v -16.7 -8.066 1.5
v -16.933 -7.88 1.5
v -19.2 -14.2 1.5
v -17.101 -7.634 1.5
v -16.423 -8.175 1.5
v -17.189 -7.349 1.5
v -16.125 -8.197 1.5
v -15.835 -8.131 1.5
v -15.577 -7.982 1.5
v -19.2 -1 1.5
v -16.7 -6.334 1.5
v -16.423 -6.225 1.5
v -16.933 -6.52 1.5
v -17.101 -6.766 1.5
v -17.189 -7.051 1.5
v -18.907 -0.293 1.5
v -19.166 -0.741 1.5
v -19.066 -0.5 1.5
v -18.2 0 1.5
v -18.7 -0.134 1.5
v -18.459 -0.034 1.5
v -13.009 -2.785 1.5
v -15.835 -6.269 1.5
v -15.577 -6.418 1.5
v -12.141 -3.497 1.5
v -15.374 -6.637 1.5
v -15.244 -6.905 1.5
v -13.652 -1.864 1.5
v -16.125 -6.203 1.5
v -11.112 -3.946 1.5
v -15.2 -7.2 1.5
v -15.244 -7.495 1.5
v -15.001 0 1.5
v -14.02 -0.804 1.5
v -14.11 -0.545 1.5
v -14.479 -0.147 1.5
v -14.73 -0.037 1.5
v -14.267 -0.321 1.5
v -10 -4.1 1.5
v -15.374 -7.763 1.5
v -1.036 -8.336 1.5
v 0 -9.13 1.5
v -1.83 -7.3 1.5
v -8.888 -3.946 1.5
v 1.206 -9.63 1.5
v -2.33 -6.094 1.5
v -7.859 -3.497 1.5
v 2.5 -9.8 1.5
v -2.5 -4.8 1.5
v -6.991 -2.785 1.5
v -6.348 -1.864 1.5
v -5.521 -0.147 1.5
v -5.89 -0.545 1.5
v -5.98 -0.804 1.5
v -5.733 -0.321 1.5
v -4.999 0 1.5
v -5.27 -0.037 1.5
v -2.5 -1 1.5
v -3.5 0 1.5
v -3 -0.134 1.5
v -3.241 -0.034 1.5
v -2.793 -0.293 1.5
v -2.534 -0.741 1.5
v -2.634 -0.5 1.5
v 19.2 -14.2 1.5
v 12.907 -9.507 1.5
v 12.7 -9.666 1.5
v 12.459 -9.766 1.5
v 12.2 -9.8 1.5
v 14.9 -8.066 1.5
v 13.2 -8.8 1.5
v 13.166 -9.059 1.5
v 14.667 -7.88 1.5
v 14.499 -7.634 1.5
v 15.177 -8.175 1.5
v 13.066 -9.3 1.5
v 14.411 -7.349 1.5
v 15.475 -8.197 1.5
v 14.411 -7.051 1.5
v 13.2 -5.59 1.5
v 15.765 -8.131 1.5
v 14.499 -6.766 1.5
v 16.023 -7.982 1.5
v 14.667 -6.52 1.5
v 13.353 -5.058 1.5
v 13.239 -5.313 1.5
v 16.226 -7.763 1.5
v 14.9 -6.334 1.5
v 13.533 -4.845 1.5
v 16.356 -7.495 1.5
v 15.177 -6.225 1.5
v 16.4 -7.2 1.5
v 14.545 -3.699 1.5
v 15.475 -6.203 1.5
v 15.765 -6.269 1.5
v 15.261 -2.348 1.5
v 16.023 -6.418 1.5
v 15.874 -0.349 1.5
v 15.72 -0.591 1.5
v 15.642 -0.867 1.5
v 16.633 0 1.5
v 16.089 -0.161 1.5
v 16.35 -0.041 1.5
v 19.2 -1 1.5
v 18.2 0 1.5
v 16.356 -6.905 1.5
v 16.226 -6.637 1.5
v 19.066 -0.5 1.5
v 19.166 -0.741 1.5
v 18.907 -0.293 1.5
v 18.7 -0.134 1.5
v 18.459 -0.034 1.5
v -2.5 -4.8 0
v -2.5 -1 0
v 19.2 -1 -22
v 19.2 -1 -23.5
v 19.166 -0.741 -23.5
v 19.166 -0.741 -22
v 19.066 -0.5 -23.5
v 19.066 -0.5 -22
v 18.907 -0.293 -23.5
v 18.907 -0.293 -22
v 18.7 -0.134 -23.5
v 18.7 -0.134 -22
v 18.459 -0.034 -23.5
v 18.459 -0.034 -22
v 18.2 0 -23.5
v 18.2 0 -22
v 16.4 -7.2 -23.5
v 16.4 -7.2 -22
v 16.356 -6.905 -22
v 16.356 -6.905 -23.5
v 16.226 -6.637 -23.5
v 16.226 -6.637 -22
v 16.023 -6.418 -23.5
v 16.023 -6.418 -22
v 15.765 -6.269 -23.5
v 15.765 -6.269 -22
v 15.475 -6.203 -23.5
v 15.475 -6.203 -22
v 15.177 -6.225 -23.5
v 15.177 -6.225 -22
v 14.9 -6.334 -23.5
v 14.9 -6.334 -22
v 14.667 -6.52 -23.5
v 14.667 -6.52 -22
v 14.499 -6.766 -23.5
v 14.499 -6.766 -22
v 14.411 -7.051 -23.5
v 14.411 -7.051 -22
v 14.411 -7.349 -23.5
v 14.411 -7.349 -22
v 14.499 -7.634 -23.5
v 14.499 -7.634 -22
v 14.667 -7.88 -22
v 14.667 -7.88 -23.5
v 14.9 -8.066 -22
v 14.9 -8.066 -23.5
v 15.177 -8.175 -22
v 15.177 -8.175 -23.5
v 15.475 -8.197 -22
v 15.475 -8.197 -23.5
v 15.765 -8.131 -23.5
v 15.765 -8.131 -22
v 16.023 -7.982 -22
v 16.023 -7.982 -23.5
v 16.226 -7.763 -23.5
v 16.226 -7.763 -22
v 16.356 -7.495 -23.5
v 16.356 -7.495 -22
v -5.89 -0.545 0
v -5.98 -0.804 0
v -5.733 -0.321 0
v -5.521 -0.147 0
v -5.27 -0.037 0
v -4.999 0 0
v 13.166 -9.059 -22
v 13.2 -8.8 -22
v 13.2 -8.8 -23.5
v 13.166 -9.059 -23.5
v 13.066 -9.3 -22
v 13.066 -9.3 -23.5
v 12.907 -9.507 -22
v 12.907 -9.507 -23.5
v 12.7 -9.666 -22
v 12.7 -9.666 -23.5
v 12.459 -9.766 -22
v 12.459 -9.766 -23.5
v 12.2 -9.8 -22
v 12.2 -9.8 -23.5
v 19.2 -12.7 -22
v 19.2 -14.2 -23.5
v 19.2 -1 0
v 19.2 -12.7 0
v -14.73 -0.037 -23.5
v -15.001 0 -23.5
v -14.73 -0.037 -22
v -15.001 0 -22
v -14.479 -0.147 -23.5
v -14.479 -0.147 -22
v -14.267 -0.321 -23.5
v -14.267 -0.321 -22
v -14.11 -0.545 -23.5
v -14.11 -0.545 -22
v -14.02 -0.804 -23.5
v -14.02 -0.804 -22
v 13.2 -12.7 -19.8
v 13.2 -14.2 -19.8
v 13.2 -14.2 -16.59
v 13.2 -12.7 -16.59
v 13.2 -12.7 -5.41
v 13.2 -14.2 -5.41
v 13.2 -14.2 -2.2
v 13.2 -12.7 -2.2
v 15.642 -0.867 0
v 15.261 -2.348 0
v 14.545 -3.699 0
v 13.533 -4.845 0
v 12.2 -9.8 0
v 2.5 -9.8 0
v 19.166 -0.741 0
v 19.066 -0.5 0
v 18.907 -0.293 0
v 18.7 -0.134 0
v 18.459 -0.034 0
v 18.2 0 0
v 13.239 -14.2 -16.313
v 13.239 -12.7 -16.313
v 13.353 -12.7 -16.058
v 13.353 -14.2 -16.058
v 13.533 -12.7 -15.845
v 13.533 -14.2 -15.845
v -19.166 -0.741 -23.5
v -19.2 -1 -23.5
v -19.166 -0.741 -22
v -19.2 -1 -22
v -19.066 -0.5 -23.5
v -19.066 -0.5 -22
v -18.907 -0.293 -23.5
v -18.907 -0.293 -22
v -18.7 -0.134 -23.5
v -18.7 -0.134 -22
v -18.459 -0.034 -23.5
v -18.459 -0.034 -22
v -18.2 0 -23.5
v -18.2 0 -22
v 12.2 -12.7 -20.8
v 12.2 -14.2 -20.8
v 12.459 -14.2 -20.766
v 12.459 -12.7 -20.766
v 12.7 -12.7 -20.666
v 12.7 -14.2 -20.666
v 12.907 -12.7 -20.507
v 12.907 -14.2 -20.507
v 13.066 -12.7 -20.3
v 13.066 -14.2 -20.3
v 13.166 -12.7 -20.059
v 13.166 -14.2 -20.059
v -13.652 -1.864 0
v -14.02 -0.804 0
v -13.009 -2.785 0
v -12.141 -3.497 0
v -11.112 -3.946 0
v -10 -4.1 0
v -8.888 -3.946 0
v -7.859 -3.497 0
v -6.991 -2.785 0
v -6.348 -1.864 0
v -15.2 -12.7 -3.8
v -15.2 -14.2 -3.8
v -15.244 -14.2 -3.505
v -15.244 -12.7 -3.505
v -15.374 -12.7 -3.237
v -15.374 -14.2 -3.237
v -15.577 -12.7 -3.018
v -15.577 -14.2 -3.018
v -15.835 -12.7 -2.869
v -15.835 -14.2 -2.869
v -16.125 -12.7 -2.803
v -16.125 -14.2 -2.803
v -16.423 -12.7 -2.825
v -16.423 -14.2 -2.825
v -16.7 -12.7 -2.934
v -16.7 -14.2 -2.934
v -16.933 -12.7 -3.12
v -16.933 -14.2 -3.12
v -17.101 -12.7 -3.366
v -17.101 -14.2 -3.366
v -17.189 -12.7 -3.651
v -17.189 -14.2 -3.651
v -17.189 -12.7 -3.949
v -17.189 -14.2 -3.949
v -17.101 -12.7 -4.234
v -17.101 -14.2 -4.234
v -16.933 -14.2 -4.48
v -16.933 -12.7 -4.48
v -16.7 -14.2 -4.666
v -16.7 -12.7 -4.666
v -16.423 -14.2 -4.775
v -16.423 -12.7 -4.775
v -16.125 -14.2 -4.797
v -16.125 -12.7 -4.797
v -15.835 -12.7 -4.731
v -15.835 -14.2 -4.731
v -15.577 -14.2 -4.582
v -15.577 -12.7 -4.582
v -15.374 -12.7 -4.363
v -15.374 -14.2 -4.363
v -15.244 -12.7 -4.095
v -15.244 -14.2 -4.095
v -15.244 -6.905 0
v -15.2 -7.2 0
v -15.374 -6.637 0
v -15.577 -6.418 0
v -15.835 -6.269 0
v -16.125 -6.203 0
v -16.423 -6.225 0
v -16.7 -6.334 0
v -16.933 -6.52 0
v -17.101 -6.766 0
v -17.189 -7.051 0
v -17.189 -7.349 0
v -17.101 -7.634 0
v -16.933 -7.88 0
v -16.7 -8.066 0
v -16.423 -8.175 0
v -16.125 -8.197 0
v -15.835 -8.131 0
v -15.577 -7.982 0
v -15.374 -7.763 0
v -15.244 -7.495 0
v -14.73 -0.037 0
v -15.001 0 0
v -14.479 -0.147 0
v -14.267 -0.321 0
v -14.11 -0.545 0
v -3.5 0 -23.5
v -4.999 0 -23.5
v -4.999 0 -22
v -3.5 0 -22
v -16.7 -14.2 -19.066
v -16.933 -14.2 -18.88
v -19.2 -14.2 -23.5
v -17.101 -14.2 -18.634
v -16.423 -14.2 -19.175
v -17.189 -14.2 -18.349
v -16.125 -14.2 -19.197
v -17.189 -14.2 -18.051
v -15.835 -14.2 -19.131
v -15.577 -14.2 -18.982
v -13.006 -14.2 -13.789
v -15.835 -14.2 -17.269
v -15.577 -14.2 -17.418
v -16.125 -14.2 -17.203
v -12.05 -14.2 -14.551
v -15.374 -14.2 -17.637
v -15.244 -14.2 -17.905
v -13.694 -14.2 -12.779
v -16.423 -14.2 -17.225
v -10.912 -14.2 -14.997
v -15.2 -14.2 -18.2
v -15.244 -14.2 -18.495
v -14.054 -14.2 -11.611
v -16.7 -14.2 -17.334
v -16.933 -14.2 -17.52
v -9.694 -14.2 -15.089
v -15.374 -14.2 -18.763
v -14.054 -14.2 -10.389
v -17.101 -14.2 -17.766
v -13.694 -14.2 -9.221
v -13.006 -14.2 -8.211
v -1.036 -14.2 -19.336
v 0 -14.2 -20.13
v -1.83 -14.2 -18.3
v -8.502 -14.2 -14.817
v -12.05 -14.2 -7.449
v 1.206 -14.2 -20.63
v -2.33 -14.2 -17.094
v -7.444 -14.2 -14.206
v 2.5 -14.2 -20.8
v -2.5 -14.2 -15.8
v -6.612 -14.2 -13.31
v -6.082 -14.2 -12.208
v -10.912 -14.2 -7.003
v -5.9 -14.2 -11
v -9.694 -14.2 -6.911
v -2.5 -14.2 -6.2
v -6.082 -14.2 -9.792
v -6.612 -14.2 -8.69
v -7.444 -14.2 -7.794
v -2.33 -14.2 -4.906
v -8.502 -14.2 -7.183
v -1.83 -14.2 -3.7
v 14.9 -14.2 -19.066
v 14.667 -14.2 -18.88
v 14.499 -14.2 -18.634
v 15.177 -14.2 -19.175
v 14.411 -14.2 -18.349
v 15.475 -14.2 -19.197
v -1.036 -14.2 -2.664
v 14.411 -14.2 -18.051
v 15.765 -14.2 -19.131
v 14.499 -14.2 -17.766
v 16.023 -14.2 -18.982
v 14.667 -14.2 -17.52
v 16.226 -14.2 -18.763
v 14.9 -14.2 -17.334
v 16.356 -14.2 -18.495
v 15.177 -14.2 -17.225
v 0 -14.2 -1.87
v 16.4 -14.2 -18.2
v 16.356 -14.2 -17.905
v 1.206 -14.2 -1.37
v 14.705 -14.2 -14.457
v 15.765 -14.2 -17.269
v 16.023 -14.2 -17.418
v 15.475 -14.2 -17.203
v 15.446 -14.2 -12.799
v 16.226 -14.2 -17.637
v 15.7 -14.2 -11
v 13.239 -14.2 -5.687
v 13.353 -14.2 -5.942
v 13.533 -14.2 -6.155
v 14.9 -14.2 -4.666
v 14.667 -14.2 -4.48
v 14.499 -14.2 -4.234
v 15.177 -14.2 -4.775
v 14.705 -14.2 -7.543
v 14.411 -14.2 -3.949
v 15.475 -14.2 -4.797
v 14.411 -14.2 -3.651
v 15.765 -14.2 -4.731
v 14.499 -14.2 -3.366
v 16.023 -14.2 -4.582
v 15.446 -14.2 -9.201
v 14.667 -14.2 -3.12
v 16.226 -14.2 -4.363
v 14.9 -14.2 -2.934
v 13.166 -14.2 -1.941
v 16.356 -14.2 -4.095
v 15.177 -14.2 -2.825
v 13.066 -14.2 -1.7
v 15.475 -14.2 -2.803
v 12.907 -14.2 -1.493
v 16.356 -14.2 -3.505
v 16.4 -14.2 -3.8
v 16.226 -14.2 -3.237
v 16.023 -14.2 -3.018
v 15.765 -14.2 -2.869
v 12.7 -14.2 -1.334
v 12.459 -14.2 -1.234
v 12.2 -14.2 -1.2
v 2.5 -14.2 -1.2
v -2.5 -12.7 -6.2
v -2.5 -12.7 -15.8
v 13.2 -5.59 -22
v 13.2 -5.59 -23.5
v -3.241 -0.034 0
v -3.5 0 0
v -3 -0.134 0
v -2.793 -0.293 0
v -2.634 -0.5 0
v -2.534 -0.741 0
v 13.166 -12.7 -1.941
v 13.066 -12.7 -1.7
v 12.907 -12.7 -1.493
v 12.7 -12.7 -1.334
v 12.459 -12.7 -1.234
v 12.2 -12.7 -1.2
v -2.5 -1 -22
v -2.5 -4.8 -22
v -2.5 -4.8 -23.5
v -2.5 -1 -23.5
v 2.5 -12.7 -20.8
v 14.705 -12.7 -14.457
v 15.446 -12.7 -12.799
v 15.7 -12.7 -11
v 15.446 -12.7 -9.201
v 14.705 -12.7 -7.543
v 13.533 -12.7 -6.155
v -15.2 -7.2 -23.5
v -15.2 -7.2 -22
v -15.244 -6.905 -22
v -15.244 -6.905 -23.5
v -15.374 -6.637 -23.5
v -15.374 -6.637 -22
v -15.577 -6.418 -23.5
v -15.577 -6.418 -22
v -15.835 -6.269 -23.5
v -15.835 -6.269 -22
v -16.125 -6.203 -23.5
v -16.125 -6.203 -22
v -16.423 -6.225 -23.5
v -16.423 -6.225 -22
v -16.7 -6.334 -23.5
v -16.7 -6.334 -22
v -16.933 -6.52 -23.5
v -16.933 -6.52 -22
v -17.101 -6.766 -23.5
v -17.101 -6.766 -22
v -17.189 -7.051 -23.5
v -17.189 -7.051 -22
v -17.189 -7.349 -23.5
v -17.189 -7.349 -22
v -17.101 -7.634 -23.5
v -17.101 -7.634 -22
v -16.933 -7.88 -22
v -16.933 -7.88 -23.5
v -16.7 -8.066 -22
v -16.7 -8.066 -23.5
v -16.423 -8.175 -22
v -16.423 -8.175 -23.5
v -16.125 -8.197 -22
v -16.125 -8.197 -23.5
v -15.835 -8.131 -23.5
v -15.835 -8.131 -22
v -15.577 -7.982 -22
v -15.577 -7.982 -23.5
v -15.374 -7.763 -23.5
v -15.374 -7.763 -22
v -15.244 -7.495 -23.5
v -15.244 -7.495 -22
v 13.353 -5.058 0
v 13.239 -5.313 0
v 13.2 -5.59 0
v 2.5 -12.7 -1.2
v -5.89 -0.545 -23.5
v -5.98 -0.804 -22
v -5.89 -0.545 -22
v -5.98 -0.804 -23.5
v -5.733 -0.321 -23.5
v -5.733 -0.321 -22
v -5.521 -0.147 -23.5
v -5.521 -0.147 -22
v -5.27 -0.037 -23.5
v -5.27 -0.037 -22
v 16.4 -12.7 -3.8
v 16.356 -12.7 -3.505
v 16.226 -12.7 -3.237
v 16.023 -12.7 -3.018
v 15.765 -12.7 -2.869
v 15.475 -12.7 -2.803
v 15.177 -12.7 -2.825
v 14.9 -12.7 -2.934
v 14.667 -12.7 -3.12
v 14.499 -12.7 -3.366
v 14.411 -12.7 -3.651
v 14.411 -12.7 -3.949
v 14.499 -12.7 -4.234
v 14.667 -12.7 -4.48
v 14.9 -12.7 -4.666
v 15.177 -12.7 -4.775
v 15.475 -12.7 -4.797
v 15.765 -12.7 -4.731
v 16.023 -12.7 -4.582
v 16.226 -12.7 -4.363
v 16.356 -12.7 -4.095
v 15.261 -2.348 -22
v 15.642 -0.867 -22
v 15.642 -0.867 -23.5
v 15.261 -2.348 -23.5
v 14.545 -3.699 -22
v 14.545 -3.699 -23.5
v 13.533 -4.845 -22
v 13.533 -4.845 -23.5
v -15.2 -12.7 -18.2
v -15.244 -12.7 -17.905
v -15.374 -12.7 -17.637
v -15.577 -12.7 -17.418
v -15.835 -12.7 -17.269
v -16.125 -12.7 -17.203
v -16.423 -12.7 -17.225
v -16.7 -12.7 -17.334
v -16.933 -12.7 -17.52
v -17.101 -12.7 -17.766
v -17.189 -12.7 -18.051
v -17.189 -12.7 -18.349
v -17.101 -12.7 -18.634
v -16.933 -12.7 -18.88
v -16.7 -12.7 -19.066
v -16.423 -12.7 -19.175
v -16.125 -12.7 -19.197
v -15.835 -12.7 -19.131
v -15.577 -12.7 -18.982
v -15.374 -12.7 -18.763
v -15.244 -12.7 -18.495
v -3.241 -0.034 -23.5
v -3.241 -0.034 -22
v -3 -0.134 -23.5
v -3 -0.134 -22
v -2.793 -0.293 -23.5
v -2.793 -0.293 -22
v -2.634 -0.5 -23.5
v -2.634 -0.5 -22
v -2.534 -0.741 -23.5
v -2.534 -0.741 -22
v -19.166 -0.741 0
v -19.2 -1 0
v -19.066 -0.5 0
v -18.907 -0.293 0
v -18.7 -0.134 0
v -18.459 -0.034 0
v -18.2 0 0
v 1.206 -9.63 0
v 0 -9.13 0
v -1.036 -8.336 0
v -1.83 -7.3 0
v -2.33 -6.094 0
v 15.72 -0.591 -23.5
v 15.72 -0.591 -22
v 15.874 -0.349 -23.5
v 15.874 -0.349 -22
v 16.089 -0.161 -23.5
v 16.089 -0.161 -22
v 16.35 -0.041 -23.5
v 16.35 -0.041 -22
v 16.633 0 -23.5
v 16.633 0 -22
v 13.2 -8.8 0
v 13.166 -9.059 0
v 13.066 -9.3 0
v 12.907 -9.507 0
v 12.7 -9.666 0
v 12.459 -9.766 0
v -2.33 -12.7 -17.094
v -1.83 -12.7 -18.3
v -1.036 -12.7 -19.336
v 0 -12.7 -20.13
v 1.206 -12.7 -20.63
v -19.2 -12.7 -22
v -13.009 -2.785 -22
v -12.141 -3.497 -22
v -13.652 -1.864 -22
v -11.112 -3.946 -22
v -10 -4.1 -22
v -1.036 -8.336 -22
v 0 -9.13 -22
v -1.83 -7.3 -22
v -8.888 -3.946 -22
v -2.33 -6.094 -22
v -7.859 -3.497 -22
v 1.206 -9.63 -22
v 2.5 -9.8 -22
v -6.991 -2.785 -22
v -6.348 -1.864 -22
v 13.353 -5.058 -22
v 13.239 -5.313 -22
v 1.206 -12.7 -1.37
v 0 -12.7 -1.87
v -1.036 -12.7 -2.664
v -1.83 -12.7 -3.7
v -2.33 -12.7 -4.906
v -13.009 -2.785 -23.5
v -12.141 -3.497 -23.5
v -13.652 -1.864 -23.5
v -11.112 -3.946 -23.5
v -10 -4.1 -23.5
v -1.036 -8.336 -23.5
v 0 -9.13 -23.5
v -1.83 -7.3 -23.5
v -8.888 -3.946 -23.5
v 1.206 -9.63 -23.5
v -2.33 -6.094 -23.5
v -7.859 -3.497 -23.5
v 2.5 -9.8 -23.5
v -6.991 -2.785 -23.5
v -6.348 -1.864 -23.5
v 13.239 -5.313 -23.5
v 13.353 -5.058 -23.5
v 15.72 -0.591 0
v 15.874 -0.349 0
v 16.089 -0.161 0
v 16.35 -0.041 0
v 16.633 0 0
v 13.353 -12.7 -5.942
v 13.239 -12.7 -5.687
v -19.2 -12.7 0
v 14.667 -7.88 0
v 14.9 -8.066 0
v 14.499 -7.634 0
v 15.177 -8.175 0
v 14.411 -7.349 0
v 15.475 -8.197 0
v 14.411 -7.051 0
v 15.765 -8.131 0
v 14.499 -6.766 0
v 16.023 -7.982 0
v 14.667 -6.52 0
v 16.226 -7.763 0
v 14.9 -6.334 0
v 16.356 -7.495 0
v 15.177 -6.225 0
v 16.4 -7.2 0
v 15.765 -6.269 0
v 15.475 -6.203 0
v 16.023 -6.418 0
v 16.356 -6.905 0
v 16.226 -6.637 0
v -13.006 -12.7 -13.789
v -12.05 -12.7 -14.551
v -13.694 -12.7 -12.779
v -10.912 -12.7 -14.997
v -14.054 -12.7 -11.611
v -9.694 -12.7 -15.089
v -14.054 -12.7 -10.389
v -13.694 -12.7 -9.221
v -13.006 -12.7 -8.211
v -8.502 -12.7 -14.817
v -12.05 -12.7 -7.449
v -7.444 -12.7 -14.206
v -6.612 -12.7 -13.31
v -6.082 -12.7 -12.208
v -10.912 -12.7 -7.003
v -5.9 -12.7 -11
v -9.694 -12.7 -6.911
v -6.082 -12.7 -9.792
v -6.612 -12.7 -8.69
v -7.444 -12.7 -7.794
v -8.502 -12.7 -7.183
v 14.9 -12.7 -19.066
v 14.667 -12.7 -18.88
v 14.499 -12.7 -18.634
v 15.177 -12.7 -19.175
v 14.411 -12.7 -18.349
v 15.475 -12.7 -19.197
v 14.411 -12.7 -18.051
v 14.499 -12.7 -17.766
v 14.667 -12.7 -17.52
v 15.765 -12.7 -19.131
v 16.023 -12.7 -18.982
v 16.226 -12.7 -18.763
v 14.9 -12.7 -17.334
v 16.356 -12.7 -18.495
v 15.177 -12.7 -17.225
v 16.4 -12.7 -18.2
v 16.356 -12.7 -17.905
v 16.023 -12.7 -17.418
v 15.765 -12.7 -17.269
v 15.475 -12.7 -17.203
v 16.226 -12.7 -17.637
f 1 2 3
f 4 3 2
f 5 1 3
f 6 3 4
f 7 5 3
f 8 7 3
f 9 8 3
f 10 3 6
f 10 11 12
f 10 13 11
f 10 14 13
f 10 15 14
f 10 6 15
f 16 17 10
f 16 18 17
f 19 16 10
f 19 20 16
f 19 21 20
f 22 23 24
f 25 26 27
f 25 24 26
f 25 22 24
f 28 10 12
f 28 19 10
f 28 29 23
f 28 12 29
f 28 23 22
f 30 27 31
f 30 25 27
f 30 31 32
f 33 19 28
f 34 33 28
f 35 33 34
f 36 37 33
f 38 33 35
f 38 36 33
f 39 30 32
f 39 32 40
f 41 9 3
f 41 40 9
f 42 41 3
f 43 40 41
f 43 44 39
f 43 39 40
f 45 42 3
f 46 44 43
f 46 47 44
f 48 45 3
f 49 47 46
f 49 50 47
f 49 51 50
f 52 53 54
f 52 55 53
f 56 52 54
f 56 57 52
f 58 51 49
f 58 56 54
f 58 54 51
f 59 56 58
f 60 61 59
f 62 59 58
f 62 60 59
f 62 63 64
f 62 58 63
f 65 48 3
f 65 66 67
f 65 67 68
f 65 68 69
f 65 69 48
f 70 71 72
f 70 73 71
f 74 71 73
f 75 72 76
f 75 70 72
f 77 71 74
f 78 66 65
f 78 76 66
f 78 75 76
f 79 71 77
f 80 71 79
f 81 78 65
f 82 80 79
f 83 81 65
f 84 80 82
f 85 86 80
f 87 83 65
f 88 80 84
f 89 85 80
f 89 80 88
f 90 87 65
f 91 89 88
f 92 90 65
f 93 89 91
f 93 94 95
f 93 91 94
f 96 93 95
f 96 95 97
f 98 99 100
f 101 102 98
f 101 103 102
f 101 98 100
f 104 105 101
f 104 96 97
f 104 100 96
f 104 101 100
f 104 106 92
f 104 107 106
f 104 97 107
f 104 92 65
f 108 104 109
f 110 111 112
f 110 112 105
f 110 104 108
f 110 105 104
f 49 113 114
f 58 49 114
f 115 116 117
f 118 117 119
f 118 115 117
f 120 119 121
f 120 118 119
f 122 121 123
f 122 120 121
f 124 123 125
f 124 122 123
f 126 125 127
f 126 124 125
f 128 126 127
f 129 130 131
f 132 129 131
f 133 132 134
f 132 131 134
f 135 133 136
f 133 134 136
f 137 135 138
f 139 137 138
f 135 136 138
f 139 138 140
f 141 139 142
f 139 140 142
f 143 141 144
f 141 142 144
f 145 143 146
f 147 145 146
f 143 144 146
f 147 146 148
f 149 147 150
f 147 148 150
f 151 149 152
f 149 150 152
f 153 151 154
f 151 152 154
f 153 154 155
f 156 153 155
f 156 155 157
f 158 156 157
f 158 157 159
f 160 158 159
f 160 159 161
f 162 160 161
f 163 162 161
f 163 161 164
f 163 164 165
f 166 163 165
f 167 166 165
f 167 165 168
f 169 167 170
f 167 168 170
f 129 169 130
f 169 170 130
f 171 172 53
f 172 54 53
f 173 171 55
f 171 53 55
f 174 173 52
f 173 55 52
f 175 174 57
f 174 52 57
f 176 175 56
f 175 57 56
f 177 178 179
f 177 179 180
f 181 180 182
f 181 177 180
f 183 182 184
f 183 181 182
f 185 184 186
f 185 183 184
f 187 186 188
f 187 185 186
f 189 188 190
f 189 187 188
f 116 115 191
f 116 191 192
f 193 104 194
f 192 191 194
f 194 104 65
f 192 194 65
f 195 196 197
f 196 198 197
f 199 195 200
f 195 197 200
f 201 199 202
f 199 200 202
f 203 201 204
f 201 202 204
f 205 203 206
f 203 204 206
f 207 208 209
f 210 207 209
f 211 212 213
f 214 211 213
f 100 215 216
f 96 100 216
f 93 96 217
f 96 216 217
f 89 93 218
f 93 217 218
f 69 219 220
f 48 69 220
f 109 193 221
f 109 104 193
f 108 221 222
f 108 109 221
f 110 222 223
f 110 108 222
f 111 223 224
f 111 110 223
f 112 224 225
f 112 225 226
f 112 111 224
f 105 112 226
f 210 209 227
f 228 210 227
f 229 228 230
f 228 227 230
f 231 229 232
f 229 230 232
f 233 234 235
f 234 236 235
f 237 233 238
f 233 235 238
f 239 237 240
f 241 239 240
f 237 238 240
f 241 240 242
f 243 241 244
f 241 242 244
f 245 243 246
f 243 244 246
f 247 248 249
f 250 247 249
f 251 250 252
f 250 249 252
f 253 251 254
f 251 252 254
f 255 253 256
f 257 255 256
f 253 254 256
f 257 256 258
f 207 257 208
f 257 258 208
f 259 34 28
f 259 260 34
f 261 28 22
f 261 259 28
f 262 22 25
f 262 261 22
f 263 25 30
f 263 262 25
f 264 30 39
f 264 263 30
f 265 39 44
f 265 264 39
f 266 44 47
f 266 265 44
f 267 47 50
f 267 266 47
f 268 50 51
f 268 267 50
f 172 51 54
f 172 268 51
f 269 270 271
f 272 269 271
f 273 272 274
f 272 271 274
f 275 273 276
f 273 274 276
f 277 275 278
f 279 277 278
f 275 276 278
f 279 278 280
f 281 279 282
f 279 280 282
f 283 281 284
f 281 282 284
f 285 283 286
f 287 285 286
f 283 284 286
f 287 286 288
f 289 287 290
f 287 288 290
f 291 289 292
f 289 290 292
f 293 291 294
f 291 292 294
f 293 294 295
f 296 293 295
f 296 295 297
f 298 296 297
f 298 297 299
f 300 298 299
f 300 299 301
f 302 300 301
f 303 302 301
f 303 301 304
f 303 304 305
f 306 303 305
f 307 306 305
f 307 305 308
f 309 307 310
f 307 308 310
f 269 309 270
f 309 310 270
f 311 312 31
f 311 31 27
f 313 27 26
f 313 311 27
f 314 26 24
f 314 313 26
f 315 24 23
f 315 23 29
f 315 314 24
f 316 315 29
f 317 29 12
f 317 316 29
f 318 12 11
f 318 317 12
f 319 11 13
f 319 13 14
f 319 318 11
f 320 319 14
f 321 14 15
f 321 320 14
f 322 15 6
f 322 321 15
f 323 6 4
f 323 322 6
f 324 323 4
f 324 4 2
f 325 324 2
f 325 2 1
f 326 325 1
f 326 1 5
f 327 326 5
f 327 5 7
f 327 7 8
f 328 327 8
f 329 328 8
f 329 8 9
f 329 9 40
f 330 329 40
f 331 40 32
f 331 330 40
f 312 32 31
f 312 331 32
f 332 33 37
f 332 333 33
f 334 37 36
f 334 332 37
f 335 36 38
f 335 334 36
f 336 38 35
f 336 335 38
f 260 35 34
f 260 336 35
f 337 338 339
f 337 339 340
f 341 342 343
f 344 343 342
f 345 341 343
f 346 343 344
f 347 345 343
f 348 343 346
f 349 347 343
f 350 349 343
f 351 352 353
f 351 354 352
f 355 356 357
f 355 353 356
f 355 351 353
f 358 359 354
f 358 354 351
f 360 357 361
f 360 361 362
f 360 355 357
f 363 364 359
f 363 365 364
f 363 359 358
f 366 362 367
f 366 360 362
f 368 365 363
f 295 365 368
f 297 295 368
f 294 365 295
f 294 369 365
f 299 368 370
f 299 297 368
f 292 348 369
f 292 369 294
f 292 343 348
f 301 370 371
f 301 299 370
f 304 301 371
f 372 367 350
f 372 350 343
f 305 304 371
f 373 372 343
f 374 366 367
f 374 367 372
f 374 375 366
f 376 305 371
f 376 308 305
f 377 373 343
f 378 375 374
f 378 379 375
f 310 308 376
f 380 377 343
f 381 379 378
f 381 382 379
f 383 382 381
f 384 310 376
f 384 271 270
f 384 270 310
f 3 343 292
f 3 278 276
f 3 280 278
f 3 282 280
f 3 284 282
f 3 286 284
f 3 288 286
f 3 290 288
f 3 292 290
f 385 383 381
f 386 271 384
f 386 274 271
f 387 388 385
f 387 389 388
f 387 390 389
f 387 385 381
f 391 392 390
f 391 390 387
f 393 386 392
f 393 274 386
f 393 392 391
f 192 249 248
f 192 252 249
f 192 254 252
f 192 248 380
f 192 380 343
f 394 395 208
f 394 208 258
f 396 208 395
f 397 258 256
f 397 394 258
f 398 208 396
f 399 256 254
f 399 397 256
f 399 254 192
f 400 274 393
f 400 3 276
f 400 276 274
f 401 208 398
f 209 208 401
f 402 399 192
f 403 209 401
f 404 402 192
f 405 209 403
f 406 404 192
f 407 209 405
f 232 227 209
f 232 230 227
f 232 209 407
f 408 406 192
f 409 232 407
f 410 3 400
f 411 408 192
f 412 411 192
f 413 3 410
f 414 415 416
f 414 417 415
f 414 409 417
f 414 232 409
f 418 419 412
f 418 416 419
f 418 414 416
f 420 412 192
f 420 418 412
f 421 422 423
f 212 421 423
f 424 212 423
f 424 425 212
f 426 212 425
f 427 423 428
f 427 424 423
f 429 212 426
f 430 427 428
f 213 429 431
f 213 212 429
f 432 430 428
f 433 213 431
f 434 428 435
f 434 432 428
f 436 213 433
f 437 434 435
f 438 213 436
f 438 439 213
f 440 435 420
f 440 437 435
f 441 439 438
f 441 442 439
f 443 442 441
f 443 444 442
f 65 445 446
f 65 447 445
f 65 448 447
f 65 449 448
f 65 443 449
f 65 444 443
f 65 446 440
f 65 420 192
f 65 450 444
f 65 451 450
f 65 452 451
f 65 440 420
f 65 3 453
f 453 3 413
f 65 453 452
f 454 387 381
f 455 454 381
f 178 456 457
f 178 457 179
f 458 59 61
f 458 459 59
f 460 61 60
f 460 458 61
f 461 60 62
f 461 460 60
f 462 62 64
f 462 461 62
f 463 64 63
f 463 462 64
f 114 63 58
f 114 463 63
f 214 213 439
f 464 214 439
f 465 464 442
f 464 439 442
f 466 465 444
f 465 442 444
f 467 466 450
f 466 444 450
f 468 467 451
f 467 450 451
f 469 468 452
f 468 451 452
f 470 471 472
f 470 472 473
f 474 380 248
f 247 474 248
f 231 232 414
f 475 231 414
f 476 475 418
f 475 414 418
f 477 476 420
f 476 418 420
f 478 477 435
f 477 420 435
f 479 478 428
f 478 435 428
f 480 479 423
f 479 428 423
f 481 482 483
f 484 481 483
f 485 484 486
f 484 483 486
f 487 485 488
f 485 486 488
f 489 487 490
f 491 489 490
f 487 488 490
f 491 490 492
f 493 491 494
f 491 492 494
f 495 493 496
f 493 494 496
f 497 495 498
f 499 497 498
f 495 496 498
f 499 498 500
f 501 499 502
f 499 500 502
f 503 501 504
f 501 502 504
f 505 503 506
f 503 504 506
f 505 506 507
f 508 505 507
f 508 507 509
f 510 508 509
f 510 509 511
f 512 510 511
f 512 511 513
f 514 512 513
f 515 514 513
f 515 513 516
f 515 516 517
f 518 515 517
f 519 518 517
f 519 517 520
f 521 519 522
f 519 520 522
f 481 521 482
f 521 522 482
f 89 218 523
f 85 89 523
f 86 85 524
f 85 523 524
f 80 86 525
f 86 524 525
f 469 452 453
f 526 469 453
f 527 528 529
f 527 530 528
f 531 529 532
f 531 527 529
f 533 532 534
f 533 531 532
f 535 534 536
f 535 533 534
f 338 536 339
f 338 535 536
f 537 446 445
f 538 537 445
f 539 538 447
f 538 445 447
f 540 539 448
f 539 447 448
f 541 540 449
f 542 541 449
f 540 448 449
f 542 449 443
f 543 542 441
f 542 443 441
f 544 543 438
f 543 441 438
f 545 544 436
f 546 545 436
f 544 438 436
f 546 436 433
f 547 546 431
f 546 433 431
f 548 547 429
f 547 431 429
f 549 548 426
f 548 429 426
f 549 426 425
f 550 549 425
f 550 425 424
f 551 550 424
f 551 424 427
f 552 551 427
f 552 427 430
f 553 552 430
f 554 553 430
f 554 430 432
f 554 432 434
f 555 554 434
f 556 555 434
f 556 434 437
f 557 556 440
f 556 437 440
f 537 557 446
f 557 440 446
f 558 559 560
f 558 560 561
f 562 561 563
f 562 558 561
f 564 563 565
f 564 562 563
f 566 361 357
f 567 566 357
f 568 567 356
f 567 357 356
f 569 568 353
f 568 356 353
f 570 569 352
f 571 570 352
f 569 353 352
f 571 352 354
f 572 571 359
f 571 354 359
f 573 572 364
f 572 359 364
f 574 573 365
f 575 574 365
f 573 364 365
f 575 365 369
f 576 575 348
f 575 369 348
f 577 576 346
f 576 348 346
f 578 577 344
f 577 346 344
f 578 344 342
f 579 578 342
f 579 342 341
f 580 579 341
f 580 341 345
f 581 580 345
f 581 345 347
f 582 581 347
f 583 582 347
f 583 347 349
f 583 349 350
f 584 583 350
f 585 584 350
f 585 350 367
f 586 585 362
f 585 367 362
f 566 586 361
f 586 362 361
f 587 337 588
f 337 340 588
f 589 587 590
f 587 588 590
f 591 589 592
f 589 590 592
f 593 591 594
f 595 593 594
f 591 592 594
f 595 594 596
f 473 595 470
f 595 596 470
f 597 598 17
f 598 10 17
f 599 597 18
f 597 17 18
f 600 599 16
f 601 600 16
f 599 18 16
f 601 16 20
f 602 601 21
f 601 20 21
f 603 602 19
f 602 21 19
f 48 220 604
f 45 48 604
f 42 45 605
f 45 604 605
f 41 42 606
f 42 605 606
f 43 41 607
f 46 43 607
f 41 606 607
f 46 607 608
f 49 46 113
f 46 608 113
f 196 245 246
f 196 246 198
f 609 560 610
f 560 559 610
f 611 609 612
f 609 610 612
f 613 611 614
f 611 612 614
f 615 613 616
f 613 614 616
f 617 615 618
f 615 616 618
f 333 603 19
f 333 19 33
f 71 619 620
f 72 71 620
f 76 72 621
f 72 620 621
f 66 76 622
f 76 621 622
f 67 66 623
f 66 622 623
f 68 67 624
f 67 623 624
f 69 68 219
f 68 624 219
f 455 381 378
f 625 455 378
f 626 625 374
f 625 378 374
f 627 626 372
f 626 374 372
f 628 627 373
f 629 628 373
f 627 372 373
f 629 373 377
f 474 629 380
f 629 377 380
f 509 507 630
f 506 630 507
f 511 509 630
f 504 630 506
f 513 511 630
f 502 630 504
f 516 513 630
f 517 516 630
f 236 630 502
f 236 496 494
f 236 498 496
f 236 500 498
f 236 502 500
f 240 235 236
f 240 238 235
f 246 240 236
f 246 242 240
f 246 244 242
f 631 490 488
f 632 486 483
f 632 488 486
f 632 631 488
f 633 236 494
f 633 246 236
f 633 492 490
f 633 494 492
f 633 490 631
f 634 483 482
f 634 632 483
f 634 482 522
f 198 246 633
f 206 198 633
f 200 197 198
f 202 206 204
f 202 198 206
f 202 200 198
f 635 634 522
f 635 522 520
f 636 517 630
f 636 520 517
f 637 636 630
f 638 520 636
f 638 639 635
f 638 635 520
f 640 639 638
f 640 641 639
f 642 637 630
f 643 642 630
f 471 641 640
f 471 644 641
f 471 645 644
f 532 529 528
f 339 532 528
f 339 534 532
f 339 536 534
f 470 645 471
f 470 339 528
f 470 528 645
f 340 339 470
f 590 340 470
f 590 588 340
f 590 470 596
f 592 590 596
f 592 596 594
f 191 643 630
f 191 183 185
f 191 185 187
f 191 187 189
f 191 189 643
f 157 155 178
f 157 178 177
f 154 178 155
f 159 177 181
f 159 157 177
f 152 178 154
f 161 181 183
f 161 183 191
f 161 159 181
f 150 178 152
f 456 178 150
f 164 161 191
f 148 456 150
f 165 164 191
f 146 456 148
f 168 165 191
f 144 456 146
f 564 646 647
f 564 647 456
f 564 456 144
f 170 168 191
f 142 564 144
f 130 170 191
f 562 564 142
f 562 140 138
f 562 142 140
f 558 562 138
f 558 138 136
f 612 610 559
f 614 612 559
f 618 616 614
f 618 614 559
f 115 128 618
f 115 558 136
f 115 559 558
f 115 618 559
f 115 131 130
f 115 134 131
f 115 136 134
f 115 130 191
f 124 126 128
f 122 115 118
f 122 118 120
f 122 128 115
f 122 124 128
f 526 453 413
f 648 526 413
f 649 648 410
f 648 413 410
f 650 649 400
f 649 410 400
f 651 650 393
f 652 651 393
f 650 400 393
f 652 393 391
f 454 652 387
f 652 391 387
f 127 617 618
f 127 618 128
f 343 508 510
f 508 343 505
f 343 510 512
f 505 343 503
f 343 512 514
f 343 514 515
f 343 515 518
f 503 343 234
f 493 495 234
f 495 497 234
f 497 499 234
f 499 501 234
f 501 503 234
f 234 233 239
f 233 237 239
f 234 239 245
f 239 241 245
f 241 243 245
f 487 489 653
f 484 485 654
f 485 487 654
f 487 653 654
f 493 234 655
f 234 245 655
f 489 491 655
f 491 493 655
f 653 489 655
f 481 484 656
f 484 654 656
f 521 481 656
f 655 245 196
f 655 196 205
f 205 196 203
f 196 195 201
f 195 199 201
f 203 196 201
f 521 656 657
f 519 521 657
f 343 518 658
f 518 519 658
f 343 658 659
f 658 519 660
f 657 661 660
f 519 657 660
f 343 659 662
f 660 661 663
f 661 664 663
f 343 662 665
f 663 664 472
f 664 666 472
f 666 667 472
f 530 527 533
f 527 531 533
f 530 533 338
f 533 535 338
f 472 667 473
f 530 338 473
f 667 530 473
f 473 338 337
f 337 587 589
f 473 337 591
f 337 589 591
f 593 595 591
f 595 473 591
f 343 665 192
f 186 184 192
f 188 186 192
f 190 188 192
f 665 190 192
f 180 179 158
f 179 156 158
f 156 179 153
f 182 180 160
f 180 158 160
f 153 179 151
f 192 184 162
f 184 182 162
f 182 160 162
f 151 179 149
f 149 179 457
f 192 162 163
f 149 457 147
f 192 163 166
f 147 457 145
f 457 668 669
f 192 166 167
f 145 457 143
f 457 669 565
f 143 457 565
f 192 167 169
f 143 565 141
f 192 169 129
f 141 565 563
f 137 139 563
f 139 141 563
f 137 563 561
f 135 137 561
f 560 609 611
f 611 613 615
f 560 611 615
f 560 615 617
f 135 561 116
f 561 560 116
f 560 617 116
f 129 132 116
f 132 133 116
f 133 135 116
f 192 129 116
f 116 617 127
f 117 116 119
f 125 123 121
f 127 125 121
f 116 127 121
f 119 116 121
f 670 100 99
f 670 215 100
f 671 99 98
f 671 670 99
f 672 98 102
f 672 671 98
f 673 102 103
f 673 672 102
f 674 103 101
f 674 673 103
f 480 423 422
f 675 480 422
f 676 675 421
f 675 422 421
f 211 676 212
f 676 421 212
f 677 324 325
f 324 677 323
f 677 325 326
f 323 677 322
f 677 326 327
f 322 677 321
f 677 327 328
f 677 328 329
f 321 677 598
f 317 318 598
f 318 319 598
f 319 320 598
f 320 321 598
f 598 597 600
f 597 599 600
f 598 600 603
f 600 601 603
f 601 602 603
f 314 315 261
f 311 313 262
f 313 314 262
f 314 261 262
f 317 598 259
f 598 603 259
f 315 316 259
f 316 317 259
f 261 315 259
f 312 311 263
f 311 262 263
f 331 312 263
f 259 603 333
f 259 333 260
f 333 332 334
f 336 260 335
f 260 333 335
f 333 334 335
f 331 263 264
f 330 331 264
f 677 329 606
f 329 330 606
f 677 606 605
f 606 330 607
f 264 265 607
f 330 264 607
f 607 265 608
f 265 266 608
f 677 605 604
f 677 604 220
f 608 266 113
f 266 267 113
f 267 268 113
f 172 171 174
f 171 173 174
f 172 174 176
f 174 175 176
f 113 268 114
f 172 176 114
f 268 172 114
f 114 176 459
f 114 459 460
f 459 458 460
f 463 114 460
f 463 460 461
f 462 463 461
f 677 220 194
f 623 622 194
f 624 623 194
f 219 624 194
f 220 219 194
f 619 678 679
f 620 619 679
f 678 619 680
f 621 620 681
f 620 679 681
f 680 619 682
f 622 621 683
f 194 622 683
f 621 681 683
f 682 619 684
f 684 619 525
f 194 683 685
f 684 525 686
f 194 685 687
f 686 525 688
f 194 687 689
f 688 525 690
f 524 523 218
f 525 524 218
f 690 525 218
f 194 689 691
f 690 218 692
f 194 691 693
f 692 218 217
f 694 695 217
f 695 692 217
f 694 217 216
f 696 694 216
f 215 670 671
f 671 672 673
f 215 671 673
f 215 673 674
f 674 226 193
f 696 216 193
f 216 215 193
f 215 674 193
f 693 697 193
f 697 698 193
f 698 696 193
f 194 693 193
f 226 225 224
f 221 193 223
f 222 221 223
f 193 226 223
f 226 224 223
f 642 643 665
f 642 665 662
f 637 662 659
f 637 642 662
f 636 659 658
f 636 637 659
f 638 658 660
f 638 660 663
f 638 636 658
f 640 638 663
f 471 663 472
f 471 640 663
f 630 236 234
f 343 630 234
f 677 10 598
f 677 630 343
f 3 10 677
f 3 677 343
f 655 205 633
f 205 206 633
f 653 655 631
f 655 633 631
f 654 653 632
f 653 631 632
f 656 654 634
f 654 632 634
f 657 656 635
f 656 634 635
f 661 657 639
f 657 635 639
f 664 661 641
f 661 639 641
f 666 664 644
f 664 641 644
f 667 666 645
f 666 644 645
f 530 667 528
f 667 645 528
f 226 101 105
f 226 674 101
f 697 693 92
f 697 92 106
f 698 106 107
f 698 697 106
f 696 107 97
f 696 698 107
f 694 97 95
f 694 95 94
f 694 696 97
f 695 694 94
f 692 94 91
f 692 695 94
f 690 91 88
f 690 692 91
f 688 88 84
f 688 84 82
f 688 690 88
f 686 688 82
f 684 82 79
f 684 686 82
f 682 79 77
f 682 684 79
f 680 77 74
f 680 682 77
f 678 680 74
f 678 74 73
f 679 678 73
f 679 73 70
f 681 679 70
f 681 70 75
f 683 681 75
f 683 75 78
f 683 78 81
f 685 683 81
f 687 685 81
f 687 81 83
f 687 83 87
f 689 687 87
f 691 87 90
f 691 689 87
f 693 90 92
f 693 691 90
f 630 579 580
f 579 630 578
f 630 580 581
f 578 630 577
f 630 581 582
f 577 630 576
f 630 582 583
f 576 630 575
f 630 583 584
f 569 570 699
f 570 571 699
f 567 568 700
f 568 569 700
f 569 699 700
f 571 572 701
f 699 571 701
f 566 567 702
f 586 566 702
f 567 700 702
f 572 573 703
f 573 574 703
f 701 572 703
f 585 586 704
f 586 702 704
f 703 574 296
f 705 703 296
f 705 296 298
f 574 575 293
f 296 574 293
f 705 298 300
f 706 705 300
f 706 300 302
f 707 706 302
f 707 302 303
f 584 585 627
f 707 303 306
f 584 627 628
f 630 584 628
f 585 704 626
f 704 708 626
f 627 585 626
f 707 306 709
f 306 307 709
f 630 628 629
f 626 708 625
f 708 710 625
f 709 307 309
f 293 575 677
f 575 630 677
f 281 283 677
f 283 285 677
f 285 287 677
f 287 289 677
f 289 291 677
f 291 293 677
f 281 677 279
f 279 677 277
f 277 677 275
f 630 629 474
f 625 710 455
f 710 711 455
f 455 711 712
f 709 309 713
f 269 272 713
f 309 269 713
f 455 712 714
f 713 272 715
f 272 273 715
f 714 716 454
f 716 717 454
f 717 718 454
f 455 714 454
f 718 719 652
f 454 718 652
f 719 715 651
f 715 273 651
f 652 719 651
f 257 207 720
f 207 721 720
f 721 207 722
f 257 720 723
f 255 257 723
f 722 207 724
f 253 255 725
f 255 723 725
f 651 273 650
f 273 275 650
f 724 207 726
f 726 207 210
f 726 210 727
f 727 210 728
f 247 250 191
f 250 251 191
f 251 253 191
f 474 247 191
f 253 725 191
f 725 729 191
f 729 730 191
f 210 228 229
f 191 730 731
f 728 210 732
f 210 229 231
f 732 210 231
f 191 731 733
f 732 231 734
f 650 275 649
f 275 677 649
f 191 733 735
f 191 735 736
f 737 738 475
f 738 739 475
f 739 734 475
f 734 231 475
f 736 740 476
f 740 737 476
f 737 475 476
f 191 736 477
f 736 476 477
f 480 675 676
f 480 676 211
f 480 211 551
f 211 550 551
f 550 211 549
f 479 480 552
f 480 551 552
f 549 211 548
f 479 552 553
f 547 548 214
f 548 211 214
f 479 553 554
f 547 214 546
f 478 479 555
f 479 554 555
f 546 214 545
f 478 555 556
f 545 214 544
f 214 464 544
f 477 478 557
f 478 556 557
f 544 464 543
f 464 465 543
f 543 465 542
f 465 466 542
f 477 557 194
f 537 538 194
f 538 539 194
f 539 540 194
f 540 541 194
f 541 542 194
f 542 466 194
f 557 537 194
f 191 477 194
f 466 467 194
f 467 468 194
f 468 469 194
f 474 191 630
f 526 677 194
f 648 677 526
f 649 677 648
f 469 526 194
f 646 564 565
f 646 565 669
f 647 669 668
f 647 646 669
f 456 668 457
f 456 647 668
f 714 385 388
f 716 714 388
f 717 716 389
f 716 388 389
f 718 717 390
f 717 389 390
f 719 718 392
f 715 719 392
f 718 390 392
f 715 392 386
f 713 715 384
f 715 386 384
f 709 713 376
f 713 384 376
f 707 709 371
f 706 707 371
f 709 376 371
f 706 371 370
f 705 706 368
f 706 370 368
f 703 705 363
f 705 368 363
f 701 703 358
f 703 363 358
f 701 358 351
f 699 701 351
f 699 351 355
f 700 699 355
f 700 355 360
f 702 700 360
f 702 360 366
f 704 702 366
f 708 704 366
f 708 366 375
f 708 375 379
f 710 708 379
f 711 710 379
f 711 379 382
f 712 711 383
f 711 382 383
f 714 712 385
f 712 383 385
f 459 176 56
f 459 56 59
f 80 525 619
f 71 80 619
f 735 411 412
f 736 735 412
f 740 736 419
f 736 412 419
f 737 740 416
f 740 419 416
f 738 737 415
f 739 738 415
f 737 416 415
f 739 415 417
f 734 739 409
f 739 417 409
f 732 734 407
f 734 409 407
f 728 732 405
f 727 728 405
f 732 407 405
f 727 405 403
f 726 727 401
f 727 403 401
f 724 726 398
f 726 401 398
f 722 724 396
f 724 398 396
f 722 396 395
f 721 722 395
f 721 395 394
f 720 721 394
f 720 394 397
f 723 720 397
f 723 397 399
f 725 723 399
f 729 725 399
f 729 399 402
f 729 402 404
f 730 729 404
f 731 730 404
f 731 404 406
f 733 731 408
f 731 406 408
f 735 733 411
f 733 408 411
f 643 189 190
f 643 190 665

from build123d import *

# Parameters (mm, degrees)
F0_W     = 38.4
F0_H     = 28.4
F0_R     = 1
F0_R_2   = 4.1
F1_DEPTH = 1.5
F2_W     = 38.4
F2_H     = 1.5
F3_DEPTH = 22
F6_W     = 38.4
F6_H     = 14.2
F7_DEPTH = 25.001
F8_R     = 4.1
F8_R_2   = 1
F9_DEPTH = 1.5
F10_R    = 1


with BuildPart() as f1:
    # F0 (on Top) → F1 (new body)
    with BuildSketch(Plane.XY):
        Rectangle(F0_W, F0_H)
        with Locations((-16.2, -7.2)):
            Circle(F0_R, mode=Mode.SUBTRACT)
        with Locations((15.4, -7.2)):
            Circle(F0_R, mode=Mode.SUBTRACT)
        with Locations((-10, 0)):
            Circle(F0_R_2, mode=Mode.SUBTRACT)
        with Locations((-16.2, 7.2)):
            Circle(F0_R, mode=Mode.SUBTRACT)
        with BuildLine():
            ThreePointArc((-2.5, 4.8), (-1.0355339059, 8.3355339059), (2.5, 9.8))
            Line((2.5, 9.8), (12.2, 9.8))
            ThreePointArc((12.2, 9.8), (12.9071067812, 9.5071067812), (13.2, 8.8))
            Line((13.2, 8.8), (13.2, 5.5901699437))
            ThreePointArc((13.2, 5.5901699437), (13.2871290708, 5.1819216533), (13.5333333333, 4.8448139512))
            ThreePointArc((13.5333333333, 4.8448139512), (15.7, 0), (13.5333333333, -4.8448139512))
            ThreePointArc((13.5333333333, -4.8448139512), (13.2871290708, -5.1819216533), (13.2, -5.5901699437))
            Line((13.2, -5.5901699437), (13.2, -8.8))
            ThreePointArc((13.2, -8.8), (12.9071067812, -9.5071067812), (12.2, -9.8))
            Line((12.2, -9.8), (2.5, -9.8))
            ThreePointArc((2.5, -9.8), (-1.0355339059, -8.3355339059), (-2.5, -4.8))
            Line((-2.5, -4.8), (-2.5, 4.8))
        make_face(mode=Mode.SUBTRACT)
        with Locations((15.4, 7.2)):
            Circle(F0_R, mode=Mode.SUBTRACT)
    extrude(amount=F1_DEPTH)

    # F2 (on face) → F3 (join)
    with BuildSketch(Plane(origin=(0, 0, 0), x_dir=(1, 0, 0), z_dir=(0, 0, -1))):
        with Locations((0, 13.45)):
            Rectangle(F2_W, F2_H)
    extrude(amount=F3_DEPTH)

    # F5: F1 across plane


with BuildPart() as f1_1:
    add(f1.part)
    add(f1.part.mirror(Plane.XY.offset(-11)))

    # F6 (on face) → F7 (cut, through all)
    with BuildSketch(Plane(origin=(0, 0, -23.5), x_dir=(1, 0, 0), z_dir=(0, 0, -1))):
        with Locations((0, -7.1)):
            Rectangle(F6_W, F6_H)
    extrude(amount=-F7_DEPTH, mode=Mode.SUBTRACT)

    # F8 (on face) → F9 (cut, through all)
    with BuildSketch(Plane.XZ.offset(14.2)):
        with Locations((-10, -11)):
            Circle(F8_R)
        with Locations((-16.2, -3.8)):
            Circle(F8_R_2)
        with Locations((15.4, -3.8)):
            Circle(F8_R_2)
        with BuildLine():
            Line((12.2, -1.2), (2.5, -1.2))
            ThreePointArc((2.5, -1.2), (-1.0355339059, -2.6644660941), (-2.5, -6.2))
            Line((-2.5, -6.2), (-2.5, -15.8))
            ThreePointArc((-2.5, -15.8), (-1.0355339059, -19.3355339059), (2.5, -20.8))
            Line((2.5, -20.8), (12.2, -20.8))
            ThreePointArc((12.2, -20.8), (12.9071067812, -20.5071067812), (13.2, -19.8))
            Line((13.2, -19.8), (13.2, -16.5901699437))
            ThreePointArc((13.2, -16.5901699437), (13.2871290708, -16.1819216533), (13.5333333333, -15.8448139512))
            ThreePointArc((13.5333333333, -15.8448139512), (15.7, -11), (13.5333333333, -6.1551860488))
            ThreePointArc((13.5333333333, -6.1551860488), (13.2871290708, -5.8180783467), (13.2, -5.4098300563))
            Line((13.2, -5.4098300563), (13.2, -2.2))
            ThreePointArc((13.2, -2.2), (12.9071067812, -1.4928932188), (12.2, -1.2))
        make_face()
        with Locations((-16.2, -18.2)):
            Circle(F8_R_2)
        with Locations((15.4, -18.2)):
            Circle(F8_R_2)
    extrude(amount=-F9_DEPTH, mode=Mode.SUBTRACT)

    # F10
    f10_edges = [f1_1.edges().sort_by_distance(p)[0] for p in [
        (-19.2, 0, -22.75),
        (-19.2, 0, 0.75),
        (-5.9, 0, 0.75),
        (-14.1, 0, 0.75),
        (-5.9, 0, -22.75),
        (-14.1, 0, -22.75),
        (-2.5, 0, -22.75),
        (15.7, 0, -22.75),
        (15.7, 0, 0.75),
        (19.2, 0, -22.75),
        (19.2, 0, 0.75),
        (-2.5, 0, 0.75),
    ]]
    fillet(f10_edges, radius=F10_R)


solid = f1_1.part
